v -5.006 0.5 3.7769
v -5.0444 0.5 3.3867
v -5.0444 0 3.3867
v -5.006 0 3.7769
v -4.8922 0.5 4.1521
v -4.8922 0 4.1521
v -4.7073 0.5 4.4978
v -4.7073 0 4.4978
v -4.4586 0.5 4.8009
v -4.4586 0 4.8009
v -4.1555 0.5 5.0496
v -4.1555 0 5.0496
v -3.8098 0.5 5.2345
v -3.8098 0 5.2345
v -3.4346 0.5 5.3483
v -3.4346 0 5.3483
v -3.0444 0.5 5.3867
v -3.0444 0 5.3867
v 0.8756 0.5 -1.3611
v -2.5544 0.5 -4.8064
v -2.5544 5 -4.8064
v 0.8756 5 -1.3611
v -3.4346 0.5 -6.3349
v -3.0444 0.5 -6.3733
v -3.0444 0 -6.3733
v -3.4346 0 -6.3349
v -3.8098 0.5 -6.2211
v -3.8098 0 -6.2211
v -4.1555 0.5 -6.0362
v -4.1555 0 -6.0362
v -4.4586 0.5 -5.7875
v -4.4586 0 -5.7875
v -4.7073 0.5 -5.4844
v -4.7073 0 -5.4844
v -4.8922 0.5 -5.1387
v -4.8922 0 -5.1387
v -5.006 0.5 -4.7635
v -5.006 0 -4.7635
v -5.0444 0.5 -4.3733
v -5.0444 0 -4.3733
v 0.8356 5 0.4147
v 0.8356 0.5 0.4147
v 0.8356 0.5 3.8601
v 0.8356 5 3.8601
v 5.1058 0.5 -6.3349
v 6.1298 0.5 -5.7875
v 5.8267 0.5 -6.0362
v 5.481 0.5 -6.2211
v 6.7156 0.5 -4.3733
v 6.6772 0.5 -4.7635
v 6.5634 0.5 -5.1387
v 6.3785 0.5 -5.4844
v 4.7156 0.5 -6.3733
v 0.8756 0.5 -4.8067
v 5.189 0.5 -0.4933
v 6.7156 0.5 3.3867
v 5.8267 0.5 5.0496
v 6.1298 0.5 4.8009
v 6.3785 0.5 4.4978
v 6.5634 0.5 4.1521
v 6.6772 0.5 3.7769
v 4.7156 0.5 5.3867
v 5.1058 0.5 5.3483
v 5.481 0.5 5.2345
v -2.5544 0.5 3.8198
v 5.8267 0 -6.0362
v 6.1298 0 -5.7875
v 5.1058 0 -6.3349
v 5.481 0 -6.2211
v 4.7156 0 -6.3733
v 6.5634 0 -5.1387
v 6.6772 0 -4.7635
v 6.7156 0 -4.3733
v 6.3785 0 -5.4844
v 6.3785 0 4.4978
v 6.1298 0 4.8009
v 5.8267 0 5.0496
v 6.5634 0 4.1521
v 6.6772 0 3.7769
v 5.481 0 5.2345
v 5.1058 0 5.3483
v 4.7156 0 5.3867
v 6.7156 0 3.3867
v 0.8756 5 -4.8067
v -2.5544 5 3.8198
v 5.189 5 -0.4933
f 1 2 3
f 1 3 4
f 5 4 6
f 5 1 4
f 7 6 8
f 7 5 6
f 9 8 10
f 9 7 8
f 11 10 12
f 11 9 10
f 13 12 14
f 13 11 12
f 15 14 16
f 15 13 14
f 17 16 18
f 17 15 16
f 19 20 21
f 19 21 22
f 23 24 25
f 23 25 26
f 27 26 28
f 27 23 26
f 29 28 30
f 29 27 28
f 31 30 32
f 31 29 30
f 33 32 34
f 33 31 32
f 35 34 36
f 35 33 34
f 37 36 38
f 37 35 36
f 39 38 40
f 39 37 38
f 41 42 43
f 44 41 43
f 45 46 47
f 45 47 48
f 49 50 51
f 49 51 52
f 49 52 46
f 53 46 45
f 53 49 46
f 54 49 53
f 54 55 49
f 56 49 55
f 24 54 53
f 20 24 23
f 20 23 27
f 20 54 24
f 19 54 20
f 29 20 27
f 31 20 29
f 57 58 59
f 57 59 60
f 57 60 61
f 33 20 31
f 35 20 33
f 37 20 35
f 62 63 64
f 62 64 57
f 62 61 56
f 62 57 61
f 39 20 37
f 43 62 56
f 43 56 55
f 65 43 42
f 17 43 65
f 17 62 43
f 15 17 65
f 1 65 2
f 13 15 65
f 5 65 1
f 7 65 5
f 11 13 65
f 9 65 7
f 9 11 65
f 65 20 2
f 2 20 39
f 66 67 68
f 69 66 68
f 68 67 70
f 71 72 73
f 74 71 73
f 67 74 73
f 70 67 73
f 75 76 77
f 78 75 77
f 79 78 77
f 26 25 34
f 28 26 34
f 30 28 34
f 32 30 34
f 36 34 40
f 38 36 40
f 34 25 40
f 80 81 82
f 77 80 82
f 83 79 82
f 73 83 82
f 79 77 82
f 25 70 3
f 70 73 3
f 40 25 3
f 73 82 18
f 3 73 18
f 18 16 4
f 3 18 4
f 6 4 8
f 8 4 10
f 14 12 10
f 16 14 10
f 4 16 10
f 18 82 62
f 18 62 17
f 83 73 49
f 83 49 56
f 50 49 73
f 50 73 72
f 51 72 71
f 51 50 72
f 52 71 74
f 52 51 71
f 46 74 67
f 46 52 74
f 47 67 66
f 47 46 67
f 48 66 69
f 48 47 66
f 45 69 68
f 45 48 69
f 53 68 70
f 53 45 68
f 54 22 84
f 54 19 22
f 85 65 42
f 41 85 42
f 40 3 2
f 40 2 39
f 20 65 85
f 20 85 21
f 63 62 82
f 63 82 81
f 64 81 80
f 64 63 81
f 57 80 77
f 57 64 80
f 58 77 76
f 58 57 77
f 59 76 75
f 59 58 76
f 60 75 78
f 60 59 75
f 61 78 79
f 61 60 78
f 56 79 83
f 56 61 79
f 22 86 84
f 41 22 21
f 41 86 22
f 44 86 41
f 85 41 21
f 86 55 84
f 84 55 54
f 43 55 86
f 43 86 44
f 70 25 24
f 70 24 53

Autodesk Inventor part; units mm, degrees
ref_plane "YZ Plane" through (0, 0, 0) normal (1, 0, 0) x (0, 1, 0)
ref_plane "XZ Plane" through (0, 0, 0) normal (0, 1, 0) x (-1, 0, 0)
ref_plane "XY Plane" through (0, 0, 0) normal (0, 0, 1) x (1, 0, 0)
sketch "Szkic1" plane through (0, 0, 0) normal (0, 1, 0) x (-1, 0, 0)
  line L0 (4.0644, 4.4067) -> (-5.7356, 4.4067)
  line L1 (-5.7356, 4.4067) -> (-5.7356, -5.3933)
  line L2 (-5.7356, -5.3933) -> (4.0644, -5.3933)
  line L3 (4.0644, -5.3933) -> (4.0644, 4.4067)
  line L4 (4.0644, 4.4067) -> (-5.7356, -5.3933) construction
  line L5 (-5.7356, 4.4067) -> (4.0644, -5.3933) construction
  line L6 (-0.8356, -0.4933) -> (-0.8356, -4.9033)
  line L7 (-0.8356, -0.4933) -> (-5.2456, -0.4933)
  line L8 (-5.2456, -0.4933) -> (-0.8356, -4.9033)
  line L9 (-0.8356, -0.4933) -> (-1.796, -0.4933)
  line L10 (-0.8356, -0.4933) -> (2.5944, -0.4933)
  line L11 (-0.8356, -0.4933) -> (2.5944, -0.4933) construction
  line L12 (2.5944, -0.4933) -> (2.5944, -4.9033)
  line L13 (2.5944, -4.9033) -> (-1.796, -0.4933)
  line L14 (-5.2456, -0.4933) -> (-0.8356, 3.9167)
  line L15 (2.5944, 3.9167) -> (-1.796, -0.4933)
  line L16 (2.5944, -0.4933) -> (2.5944, 3.9167)
  line L17 (-0.8356, -0.4933) -> (-0.8356, 3.9167)
  line L18 (-6.7156, 5.3867) -> (5.0444, 5.3867)
  line L19 (5.0444, 5.3867) -> (5.0444, -6.3733)
  line L20 (5.0444, -6.3733) -> (-6.7156, -6.3733)
  line L21 (-6.7156, -6.3733) -> (-6.7156, 5.3867)
  line L22 (-6.7156, 5.3867) -> (5.0444, -6.3733) construction
  line L23 (5.0444, 5.3867) -> (-6.7156, -6.3733) construction
  point P0 (0, 0)
  point P1 (-0.8356, -1.458)
  point P2 (-0.8356, 0.4714)
  dimension "d0" = 9.8
  dimension "d1" = 9.8
  dimension "d2" = 4.41
  dimension "d3" = 4.41
  dimension "d4" = 0.9604
  dimension "d5" = 3.43
  dimension "d6" = 0
  dimension "d7" = 4.41
  dimension "d8" = 90
  dimension "d9" = 11.76
  dimension "d10" = 11.76
extrude "Wyciągnięcie proste1" add sketch "Szkic1" along normal blind 0.5 contours L3 L2 L1 L0 | L10 L12 L13 L6 | L6 L13 L7 | L17 L15 L16 L10 | L7 L15 L17 | L6 L8 L7 L13 | L7 L14 L17 L15 | L18 L19 L20 L21
extrude "Wyciągnięcie proste2" add sketch "Szkic1" along normal blind 5 contours L10 L12 L13 L6 | L6 L13 L7 | L17 L15 L16 L10 | L7 L15 L17 | L6 L8 L7 L13 | L7 L14 L17 L15
fillet "Zaokrąglenie1" radius 2 4 edges at (6.7156, 0.25, 5.3867) (-5.0444, 0.25, 5.3867) (6.7156, 0.25, -6.3733) (-5.0444, 0.25, -6.3733)
offset faces "Rozmiar1" outward -0.04 faces at (2.3056, 2, 2.4467) (-1.4511, 2, 2.7682) (3.7756, 2, -1.9633) (0.8356, 2, -3.7549) (-0.3078, 2, -2.6064) (-2.5944, 3.5, -1.9633)
properties part number "guzik_musik"
